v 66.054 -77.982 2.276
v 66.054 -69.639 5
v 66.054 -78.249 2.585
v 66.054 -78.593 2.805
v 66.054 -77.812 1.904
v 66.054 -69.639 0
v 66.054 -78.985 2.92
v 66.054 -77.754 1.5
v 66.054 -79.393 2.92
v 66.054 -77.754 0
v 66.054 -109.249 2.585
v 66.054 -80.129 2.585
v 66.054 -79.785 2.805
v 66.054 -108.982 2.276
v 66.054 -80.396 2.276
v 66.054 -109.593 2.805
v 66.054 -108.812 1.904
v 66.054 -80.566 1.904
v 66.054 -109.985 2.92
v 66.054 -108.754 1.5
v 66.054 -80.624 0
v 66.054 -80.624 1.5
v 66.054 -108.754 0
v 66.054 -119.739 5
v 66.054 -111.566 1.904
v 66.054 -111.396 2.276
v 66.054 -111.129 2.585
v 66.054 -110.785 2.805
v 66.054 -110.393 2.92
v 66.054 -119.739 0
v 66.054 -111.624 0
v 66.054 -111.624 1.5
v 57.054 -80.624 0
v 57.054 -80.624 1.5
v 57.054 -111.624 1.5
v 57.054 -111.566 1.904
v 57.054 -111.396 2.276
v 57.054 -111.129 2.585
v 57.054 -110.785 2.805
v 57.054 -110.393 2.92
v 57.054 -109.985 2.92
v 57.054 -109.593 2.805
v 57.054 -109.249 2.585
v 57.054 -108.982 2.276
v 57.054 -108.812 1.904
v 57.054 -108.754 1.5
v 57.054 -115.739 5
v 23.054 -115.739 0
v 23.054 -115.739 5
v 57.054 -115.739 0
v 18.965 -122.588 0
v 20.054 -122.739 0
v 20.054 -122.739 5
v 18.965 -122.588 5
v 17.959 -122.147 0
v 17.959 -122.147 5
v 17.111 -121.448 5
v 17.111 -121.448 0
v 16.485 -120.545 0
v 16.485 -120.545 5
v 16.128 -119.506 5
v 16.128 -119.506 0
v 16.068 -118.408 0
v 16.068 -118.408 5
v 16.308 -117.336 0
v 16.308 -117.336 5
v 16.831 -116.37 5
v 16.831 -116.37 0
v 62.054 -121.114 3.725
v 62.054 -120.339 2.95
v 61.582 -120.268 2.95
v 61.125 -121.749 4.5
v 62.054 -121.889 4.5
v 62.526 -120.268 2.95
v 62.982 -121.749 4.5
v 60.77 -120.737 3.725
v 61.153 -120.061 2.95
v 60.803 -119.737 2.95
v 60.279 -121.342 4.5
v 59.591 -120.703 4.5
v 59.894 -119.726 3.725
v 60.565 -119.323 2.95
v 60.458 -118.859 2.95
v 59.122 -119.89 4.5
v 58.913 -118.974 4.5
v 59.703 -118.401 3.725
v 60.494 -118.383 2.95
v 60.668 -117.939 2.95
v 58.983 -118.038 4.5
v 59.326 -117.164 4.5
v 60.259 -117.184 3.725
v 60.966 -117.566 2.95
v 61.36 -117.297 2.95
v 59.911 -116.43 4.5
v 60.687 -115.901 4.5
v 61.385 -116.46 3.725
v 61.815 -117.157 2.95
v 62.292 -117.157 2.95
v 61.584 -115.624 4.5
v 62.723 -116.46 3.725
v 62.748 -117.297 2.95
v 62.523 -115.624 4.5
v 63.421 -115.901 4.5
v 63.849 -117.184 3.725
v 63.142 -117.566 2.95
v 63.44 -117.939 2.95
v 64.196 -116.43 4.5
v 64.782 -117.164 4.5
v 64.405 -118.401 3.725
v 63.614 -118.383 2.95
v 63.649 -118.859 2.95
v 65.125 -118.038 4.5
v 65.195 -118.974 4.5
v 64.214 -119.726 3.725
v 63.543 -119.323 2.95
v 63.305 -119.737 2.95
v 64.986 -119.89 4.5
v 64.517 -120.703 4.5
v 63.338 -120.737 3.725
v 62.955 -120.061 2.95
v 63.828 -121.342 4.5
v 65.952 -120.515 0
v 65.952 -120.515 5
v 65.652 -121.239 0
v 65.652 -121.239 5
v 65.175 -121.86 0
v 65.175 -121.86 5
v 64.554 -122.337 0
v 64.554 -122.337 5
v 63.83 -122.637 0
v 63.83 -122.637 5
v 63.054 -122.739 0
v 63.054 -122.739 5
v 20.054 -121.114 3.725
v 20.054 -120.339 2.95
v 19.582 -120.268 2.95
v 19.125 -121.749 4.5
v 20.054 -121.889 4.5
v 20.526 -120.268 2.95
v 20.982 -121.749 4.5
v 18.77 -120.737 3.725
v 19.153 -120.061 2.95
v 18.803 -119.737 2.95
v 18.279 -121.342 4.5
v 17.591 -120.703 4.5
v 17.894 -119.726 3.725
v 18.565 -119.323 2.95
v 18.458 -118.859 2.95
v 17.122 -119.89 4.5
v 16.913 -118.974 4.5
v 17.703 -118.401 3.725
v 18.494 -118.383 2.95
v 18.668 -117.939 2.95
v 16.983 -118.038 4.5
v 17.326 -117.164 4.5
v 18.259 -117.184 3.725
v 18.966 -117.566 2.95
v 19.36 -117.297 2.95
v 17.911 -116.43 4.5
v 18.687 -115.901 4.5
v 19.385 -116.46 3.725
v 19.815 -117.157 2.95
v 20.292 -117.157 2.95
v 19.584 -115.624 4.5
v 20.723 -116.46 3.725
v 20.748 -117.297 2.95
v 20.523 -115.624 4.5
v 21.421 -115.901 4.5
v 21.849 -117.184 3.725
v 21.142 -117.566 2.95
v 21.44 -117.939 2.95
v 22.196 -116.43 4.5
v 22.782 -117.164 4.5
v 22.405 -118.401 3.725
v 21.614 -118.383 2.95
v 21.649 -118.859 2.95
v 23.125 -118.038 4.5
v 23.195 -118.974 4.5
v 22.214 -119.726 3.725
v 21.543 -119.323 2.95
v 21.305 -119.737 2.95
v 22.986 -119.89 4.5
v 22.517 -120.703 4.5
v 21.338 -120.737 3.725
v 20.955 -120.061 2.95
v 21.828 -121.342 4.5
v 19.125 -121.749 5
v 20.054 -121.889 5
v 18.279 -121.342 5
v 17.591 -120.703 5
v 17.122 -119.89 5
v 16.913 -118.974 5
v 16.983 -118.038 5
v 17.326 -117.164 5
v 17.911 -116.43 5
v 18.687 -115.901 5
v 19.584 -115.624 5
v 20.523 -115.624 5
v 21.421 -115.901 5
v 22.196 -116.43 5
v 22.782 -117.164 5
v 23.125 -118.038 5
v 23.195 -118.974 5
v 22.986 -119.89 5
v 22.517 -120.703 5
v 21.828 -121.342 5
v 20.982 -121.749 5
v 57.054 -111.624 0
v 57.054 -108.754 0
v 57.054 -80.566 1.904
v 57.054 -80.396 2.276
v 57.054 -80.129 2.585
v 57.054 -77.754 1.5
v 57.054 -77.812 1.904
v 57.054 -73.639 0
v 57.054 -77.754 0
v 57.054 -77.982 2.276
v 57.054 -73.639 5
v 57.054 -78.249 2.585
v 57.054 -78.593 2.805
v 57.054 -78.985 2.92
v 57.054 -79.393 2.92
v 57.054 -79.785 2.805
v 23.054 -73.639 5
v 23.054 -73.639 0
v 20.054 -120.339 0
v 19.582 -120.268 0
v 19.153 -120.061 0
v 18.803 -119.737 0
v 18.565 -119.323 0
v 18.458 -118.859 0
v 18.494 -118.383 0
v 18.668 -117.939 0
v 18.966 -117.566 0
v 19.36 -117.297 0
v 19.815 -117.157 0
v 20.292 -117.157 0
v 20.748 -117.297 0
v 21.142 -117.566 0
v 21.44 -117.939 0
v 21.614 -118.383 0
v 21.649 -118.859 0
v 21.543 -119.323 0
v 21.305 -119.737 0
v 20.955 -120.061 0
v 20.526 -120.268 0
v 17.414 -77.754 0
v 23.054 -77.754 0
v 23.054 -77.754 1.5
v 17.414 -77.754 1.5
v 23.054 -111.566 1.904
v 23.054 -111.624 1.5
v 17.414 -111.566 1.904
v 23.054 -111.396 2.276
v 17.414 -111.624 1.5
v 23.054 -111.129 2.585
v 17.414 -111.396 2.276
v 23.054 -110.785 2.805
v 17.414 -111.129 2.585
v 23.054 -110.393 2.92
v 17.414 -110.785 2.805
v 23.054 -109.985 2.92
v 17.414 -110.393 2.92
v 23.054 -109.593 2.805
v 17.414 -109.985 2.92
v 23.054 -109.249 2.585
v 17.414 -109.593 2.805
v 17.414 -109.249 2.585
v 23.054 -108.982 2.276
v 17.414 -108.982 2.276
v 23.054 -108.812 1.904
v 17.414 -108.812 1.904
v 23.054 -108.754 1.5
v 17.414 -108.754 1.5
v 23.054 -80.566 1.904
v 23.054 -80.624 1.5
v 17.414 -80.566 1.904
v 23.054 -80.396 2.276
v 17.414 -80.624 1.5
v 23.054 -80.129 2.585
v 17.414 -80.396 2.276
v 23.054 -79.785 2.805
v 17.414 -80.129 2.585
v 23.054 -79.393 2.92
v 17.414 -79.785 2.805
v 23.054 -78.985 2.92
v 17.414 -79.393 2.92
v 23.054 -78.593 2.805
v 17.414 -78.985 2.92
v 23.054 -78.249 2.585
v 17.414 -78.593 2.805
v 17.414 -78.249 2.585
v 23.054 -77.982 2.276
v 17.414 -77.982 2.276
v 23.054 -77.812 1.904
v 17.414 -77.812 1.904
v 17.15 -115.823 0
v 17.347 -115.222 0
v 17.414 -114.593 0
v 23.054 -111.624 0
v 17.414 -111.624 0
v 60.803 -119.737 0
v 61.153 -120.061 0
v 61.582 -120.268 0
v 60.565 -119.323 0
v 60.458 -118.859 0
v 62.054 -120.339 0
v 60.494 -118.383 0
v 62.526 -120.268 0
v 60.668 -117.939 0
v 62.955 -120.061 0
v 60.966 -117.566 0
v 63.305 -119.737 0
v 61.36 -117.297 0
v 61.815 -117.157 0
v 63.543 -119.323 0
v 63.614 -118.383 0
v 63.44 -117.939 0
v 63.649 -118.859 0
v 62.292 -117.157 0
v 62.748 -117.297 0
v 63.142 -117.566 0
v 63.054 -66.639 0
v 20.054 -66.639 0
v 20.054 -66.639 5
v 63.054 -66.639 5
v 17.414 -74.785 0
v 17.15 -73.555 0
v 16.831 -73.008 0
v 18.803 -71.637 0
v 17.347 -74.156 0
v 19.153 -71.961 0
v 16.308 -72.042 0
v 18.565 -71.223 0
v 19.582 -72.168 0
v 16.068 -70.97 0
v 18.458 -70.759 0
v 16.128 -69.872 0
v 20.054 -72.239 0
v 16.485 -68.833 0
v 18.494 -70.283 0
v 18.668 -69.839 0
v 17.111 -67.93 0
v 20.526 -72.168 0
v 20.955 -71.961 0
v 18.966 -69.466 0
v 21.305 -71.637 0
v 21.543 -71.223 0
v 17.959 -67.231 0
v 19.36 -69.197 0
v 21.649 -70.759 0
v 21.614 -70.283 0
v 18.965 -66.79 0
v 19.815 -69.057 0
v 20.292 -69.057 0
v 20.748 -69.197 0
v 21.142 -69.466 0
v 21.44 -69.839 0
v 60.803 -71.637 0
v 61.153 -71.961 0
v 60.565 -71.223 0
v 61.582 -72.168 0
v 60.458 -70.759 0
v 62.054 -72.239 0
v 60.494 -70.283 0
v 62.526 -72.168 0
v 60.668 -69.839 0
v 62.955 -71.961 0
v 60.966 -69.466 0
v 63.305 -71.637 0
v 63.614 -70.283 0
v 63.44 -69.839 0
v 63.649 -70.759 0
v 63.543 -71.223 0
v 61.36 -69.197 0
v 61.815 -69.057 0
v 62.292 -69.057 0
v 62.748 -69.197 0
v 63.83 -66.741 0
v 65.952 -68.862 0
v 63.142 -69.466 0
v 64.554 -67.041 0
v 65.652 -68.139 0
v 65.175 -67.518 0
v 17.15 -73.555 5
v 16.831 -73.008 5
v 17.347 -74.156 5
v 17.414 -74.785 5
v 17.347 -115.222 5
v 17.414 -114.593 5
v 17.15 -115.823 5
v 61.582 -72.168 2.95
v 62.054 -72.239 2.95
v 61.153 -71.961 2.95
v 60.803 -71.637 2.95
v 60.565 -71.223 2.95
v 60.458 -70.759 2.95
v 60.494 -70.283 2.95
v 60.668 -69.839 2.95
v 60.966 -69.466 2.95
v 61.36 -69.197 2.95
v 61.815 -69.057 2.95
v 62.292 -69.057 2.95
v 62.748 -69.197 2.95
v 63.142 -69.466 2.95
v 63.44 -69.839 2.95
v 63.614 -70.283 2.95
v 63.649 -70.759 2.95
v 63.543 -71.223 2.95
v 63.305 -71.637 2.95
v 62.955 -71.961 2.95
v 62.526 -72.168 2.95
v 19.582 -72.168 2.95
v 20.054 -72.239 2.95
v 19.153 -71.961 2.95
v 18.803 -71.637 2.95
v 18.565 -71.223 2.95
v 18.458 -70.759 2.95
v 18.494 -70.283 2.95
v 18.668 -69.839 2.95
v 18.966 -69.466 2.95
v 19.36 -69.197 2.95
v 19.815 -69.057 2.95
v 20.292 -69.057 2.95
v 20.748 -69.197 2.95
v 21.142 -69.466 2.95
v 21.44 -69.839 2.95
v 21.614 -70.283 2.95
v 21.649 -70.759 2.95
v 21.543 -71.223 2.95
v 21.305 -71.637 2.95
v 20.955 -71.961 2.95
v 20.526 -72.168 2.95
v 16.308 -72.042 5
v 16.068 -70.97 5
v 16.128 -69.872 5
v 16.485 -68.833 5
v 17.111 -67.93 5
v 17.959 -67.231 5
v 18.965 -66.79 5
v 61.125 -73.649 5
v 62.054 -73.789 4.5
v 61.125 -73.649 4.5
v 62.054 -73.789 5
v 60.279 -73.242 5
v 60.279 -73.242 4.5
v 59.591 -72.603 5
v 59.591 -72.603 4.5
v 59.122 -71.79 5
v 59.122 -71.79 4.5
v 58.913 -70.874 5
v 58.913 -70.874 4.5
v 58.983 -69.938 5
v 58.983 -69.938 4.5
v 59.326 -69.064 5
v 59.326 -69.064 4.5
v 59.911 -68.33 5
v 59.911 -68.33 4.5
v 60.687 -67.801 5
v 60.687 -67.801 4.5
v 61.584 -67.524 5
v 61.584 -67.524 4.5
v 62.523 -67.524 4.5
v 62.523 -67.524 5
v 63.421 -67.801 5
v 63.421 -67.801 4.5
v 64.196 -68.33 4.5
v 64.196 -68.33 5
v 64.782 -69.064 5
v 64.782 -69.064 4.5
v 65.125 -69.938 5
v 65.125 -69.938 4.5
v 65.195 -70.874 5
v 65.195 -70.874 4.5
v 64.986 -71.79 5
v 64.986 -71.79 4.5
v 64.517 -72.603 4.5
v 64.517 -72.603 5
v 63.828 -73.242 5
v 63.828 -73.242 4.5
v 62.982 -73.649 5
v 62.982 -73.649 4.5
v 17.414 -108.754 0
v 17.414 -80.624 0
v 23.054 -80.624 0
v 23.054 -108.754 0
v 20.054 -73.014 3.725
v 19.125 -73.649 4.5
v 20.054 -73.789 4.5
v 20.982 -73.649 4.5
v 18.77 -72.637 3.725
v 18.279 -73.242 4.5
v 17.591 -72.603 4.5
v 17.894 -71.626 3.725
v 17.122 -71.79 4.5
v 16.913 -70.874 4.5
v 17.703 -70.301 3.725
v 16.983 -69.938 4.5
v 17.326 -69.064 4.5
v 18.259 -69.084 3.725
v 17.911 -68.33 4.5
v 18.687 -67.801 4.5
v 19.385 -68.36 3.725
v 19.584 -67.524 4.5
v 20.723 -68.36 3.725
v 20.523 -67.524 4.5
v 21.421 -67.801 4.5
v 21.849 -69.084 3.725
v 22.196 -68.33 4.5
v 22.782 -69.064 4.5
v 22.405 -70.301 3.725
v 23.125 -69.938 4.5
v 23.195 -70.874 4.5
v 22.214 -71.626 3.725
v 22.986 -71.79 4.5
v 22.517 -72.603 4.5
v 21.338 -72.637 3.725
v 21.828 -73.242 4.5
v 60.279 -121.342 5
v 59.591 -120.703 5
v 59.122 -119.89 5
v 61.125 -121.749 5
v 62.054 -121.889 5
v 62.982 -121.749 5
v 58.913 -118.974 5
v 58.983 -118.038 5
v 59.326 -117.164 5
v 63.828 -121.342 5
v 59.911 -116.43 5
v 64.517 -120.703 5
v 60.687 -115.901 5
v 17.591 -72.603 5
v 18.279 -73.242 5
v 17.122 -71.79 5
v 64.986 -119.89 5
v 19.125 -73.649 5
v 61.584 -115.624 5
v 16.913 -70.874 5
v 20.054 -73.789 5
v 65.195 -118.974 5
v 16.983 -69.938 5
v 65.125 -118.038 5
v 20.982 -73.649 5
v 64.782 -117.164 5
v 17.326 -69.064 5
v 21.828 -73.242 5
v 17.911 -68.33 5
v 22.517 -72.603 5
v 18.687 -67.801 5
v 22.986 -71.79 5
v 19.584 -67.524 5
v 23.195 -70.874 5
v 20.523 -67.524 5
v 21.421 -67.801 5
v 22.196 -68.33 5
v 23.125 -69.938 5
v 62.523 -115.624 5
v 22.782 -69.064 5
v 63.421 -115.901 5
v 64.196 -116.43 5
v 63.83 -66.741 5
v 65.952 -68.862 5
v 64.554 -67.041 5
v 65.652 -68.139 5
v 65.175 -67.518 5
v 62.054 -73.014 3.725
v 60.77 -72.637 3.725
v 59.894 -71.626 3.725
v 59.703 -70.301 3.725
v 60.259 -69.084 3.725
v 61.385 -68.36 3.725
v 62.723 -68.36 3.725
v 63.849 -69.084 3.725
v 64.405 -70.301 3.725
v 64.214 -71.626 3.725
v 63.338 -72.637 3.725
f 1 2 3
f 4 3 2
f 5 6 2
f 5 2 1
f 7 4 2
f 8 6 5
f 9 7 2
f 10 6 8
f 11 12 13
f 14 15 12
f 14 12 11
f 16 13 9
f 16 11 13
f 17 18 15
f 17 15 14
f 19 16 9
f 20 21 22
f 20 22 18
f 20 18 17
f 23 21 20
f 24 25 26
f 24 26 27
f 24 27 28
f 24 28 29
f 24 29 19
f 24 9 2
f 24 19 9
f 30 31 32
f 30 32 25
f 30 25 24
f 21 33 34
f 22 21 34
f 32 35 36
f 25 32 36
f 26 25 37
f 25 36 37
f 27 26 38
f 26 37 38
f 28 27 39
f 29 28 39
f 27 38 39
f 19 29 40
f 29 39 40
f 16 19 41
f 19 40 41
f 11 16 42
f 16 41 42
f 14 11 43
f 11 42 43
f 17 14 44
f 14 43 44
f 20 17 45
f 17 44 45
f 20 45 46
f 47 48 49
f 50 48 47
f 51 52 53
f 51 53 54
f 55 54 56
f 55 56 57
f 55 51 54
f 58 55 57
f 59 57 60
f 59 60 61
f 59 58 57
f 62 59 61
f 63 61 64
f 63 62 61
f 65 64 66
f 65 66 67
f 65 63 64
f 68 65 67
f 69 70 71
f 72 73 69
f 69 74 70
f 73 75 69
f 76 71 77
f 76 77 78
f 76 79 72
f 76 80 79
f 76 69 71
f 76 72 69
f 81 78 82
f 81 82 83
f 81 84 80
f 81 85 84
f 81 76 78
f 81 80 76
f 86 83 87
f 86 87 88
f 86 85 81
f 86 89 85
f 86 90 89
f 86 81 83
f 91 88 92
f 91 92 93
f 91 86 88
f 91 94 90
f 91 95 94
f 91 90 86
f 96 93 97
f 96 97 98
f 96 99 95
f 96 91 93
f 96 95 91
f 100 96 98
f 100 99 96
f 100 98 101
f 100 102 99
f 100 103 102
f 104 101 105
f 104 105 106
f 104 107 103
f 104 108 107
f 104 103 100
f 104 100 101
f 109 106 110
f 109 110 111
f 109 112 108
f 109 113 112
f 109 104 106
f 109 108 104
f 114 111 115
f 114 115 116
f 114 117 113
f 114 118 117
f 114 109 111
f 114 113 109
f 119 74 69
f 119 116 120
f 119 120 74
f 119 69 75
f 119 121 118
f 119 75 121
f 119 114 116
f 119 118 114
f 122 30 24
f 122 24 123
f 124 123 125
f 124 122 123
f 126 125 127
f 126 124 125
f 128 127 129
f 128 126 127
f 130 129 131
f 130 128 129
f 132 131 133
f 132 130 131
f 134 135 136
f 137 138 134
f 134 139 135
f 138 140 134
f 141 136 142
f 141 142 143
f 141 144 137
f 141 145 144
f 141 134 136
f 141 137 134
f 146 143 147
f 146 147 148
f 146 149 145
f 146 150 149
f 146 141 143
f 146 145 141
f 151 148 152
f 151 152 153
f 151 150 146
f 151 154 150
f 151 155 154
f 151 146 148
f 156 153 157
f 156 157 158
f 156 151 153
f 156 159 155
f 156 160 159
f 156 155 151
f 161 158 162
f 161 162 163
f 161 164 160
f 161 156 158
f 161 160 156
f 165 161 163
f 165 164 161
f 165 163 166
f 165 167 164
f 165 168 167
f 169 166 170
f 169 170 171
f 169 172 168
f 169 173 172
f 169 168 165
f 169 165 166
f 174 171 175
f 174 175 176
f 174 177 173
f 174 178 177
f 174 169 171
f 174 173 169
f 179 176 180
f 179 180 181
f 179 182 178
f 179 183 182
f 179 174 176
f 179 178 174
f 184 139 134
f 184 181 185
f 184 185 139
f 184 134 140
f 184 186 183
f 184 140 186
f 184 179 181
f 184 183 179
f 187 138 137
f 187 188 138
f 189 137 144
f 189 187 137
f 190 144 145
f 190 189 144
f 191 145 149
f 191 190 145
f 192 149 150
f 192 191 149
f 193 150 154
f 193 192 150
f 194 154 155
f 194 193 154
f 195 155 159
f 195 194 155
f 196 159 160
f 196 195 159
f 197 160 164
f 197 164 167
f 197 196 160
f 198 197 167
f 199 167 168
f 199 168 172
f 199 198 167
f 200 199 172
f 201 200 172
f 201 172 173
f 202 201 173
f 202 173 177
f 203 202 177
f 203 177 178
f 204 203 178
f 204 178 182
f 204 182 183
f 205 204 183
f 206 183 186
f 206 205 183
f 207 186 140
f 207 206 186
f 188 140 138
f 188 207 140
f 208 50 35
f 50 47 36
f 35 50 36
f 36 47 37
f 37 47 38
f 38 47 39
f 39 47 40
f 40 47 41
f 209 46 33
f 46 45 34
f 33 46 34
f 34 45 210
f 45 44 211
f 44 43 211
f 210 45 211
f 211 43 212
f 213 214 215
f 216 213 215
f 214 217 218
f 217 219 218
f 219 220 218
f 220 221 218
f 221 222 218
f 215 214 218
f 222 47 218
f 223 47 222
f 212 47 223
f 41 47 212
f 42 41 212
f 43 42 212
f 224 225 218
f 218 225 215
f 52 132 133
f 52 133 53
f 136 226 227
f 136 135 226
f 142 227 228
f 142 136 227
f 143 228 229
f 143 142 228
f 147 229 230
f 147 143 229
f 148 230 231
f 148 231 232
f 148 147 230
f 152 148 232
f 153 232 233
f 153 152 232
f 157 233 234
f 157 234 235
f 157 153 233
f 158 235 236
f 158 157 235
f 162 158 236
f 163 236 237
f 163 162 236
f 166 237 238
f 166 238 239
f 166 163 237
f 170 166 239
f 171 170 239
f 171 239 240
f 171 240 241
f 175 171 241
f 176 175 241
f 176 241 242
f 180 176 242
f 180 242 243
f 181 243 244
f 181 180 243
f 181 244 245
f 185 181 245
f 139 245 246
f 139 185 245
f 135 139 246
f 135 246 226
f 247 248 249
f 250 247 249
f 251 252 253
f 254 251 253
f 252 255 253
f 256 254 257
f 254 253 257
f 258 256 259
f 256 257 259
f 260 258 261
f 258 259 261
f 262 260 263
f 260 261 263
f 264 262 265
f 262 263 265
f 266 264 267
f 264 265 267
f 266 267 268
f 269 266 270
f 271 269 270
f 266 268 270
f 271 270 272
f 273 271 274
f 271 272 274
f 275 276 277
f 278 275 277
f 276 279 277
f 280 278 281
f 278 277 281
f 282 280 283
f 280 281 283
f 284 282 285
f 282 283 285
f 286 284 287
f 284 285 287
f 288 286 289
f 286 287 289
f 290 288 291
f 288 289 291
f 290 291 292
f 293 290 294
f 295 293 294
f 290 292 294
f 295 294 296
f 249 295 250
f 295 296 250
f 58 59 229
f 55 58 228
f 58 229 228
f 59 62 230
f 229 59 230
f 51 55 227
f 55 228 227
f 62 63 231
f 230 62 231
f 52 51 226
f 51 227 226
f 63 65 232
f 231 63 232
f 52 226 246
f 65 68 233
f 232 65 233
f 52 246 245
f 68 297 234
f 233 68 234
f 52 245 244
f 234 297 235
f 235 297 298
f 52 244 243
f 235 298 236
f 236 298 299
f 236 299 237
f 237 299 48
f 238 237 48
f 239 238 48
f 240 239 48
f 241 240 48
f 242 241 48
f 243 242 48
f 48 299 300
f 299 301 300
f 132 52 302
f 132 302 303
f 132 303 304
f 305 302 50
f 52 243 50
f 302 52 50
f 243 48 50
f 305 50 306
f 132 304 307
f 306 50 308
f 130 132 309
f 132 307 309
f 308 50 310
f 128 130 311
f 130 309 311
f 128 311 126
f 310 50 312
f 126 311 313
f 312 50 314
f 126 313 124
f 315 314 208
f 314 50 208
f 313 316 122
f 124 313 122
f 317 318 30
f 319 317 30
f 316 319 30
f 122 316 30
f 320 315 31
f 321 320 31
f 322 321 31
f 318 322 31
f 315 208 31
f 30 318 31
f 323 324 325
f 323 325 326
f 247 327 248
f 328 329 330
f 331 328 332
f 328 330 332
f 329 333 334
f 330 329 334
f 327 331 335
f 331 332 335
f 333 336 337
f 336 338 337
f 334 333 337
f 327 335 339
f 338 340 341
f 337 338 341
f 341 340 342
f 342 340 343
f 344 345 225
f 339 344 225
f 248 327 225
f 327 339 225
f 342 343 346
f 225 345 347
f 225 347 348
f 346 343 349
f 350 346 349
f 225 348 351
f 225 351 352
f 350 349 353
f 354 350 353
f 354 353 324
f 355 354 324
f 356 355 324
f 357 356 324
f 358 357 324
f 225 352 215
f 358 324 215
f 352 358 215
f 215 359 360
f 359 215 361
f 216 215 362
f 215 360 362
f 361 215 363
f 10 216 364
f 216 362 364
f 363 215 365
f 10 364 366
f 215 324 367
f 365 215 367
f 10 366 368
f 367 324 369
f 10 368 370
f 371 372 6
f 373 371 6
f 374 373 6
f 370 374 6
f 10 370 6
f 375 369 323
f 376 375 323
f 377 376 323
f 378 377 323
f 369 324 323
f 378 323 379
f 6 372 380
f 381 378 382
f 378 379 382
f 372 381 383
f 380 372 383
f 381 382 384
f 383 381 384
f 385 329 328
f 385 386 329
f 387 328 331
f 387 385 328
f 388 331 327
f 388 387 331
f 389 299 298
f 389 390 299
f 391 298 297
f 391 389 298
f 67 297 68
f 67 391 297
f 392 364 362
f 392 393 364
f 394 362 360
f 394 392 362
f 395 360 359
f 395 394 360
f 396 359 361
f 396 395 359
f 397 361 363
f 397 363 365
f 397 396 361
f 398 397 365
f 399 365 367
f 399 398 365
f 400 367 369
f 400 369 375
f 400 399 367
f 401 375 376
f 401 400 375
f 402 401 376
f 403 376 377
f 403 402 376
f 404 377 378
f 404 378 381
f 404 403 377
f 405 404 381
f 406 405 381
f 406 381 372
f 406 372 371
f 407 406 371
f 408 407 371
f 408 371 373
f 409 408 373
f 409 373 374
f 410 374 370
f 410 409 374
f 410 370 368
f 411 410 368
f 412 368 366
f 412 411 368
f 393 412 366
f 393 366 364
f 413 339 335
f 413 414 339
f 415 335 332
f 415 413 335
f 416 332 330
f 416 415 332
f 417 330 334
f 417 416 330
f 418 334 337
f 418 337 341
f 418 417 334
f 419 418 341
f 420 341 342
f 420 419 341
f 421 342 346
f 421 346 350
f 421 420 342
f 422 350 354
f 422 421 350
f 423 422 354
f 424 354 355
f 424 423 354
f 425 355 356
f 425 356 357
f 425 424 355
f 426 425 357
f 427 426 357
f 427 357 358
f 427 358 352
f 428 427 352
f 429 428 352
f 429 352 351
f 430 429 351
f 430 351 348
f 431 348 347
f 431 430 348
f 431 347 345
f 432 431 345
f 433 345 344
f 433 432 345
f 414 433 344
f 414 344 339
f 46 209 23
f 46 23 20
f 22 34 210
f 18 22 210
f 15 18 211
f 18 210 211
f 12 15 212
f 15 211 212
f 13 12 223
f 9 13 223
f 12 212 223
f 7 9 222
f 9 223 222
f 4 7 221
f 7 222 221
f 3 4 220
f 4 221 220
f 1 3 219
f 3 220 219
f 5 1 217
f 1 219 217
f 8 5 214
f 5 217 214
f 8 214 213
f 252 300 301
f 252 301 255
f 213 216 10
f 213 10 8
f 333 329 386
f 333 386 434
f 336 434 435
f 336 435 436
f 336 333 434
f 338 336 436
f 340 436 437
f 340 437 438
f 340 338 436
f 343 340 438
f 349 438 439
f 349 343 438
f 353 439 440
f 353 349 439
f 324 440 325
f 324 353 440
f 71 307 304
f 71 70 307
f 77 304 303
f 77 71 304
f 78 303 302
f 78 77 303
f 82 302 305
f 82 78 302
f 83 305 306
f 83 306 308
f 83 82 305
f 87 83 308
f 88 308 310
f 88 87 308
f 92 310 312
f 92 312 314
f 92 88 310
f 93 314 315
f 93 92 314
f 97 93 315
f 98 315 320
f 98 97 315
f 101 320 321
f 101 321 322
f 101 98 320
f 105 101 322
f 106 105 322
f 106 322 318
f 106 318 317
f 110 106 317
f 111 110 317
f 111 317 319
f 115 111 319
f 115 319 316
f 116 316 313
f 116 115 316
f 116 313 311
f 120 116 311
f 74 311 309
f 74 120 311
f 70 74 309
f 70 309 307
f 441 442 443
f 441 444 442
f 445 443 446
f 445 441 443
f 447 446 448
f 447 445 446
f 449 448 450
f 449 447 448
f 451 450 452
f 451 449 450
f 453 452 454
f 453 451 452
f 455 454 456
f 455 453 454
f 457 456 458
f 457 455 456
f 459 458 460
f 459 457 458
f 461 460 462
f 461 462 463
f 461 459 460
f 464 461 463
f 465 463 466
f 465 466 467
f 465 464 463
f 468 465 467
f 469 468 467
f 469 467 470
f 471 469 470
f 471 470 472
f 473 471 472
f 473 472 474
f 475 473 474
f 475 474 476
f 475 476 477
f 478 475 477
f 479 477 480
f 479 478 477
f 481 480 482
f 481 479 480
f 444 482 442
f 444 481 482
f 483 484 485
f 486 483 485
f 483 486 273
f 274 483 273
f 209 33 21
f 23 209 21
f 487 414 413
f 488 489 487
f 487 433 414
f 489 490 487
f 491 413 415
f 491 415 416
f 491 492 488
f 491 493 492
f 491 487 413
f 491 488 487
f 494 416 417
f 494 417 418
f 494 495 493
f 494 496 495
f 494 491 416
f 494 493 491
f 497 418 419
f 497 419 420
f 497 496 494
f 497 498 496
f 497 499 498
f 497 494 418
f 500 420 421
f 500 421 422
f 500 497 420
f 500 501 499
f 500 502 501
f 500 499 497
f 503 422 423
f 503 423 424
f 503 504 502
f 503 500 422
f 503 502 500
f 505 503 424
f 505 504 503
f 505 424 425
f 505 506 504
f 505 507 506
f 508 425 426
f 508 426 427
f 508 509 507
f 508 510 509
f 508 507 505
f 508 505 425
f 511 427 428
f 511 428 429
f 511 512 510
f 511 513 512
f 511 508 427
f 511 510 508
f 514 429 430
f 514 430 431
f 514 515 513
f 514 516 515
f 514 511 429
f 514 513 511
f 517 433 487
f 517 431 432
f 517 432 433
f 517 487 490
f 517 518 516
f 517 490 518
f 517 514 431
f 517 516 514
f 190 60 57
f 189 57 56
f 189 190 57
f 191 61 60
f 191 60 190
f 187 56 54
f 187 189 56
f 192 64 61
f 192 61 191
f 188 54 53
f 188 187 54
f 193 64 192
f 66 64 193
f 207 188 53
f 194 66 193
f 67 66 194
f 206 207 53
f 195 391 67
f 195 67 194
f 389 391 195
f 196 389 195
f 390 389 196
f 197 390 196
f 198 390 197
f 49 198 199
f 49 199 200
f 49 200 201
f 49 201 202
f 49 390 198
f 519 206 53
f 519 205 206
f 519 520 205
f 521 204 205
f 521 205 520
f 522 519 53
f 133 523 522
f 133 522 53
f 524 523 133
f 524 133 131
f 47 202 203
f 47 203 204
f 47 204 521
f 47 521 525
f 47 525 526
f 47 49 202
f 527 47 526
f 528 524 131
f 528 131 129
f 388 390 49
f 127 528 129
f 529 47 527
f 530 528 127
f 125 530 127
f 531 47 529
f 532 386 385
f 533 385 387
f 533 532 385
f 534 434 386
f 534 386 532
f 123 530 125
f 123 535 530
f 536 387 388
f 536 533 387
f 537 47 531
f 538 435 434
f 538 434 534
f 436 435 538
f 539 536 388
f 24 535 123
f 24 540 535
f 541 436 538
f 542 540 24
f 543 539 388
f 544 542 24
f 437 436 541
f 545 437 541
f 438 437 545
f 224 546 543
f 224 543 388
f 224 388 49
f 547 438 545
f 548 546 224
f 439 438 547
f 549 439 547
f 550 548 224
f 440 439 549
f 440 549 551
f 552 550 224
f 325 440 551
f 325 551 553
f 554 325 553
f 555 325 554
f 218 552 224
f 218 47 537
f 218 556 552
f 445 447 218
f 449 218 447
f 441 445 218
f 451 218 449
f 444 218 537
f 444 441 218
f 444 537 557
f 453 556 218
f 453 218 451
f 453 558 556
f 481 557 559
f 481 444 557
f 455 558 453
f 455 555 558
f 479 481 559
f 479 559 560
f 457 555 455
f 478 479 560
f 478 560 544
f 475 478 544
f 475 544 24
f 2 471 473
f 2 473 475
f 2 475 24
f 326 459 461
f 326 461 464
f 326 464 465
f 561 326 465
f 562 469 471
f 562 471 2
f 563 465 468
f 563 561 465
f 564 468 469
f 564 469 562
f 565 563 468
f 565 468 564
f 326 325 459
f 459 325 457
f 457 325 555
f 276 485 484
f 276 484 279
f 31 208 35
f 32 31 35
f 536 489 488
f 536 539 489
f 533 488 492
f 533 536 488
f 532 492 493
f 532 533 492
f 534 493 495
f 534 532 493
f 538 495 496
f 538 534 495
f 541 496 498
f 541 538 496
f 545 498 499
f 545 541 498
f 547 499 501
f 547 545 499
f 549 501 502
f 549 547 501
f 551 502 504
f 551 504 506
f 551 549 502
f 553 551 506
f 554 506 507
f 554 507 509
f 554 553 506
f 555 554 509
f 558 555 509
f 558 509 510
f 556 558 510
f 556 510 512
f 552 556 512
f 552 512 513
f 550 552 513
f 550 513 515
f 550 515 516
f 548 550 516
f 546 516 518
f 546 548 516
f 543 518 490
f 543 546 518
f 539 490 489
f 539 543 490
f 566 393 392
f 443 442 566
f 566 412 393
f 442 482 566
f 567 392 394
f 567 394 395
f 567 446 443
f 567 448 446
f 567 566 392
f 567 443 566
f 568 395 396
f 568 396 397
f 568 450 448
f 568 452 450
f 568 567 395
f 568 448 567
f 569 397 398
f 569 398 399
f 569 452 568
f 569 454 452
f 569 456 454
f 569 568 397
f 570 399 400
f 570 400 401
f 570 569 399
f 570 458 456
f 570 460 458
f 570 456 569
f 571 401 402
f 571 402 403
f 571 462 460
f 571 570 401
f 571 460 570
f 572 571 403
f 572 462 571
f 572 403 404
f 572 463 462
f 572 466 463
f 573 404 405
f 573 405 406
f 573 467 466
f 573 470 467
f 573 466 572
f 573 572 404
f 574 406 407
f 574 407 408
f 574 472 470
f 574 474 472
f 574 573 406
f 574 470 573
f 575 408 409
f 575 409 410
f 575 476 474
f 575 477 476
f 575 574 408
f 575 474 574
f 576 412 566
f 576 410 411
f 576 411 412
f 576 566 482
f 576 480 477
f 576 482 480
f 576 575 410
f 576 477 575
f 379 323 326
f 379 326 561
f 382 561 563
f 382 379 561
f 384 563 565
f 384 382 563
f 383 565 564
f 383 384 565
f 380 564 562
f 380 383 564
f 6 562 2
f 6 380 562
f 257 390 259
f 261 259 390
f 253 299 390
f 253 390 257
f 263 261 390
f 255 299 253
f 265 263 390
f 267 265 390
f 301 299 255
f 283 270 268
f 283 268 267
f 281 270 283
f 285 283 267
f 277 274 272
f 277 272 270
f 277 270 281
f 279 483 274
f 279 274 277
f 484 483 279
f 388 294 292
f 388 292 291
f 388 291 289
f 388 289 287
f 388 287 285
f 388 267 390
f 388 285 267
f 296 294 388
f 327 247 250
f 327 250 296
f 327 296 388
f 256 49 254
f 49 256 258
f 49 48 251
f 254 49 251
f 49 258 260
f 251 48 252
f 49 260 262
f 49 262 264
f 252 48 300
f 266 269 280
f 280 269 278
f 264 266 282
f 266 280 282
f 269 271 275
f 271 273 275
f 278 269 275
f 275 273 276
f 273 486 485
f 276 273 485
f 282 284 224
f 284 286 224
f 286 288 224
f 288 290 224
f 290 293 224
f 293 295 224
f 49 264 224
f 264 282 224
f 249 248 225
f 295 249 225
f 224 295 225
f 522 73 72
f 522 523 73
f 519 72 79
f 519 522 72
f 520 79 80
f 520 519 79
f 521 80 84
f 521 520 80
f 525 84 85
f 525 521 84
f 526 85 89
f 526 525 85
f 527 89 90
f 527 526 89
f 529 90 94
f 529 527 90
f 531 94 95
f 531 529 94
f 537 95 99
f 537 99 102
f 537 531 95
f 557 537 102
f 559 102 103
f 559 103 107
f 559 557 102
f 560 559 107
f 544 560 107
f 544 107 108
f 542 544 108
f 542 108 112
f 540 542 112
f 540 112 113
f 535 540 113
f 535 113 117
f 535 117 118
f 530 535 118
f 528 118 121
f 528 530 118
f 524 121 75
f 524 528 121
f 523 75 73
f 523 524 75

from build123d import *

# Parameters (mm, degrees)
SKETCH1_R                                    = 1.25
SKETCH1_W                                    = 36
SKETCH1_H                                    = 42.1
BOSS_EXTRUDE1_DEPTH                          = 5
SKETCH6_W                                    = 2
SKETCH6_H                                    = 42.1
BOSS_EXTRUDE4_DEPTH                          = 5
CSK_FOR_M3_COUNTERSUNK_FLAT_HEAD_SCR_2_COUNT = 2
CSK_FOR_M3_COUNTERSUNK_FLAT_HEAD_SCR_2_PITCH = 48.1
CSK_FOR_M3_COUNTERSUNK_FLAT_HEAD_SCR_3_COUNT = 2
CSK_FOR_M3_COUNTERSUNK_FLAT_HEAD_SCR_3_PITCH = 63.856166499
CSK_FOR_M3_COUNTERSUNK_FLAT_HEAD_SCR_4_COUNT = 2
CSK_FOR_M3_COUNTERSUNK_FLAT_HEAD_SCR_4_PITCH = 42
FURO_COM_FOLGA_DE_M34_D                      = 2.87
FILETE1_R                                    = 3
ESBO_O3_W                                    = 1.5
ESBO_O3_H                                    = 2.87
CORTE_EXTRUS_O1_DEPTH                        = 63
CORTE_EXTRUS_O1_DEPTH_BACK                   = 10


with BuildPart() as part:
    # Sketch1 → Boss-Extrude1 (new body)
    with BuildSketch(Plane.XY):
        with BuildLine():
            Line((20.053938932, -66.638943184), (63.053938932, -66.638943184))
            ThreePointArc((63.053938932, -66.638943184), (65.175259276, -67.517622841), (66.053938932, -69.638943184))
            Line((66.053938932, -69.638943184), (66.053938932, -119.738943184))
            ThreePointArc((66.053938932, -119.738943184), (65.175259276, -121.860263528), (63.053938932, -122.738943184))
            Line((63.053938932, -122.738943184), (20.053938932, -122.738943184))
            ThreePointArc((20.053938932, -122.738943184), (16.310928808, -120.149572552), (17.413938931, -115.73388079))
            Line((17.413938931, -115.73388079), (17.413938931, -73.644005579))
            ThreePointArc((17.413938931, -73.644005579), (16.310928808, -69.228313817), (20.053938932, -66.638943184))
        make_face()
        with Locations((20.053938932, -70.638943184)):
            Circle(SKETCH1_R, mode=Mode.SUBTRACT)
        with Locations((20.053938932, -118.738943184)):
            Circle(SKETCH1_R, mode=Mode.SUBTRACT)
        with Locations((62.053938932, -70.638943184)):
            Circle(SKETCH1_R, mode=Mode.SUBTRACT)
        with Locations((62.053938932, -118.738943184)):
            Circle(SKETCH1_R, mode=Mode.SUBTRACT)
        with Locations((41.053938932, -94.688943184)):
            Rectangle(SKETCH1_W, SKETCH1_H, mode=Mode.SUBTRACT)
    extrude(amount=BOSS_EXTRUDE1_DEPTH)

    # Sketch6 → Boss-Extrude4 (add)
    with BuildSketch(Plane.XY.offset(5)):
        with Locations((58.053938932, -94.688943184)):
            Rectangle(SKETCH6_W, SKETCH6_H)
    extrude(amount=-BOSS_EXTRUDE4_DEPTH)

    # Sketch2 → CSK for M3 Countersunk Flat Head Screw1 (revolve, cut)
    with BuildSketch(Plane(origin=(20.053938932, -118.738943184, 5), x_dir=(0, -1, 0), z_dir=(1, 0, 0))):
        Polygon((0, 0), (0, 5), (1.6, 5), (1.6, 2.05), (3.15, 0.5), (3.15, 0), align=None)
    csk_for_m3_countersunk_flat_head_screw1 = revolve(axis=Axis((20.053938932, -118.738943184, 11.35), (0, 0, -1)), mode=Mode.SUBTRACT)

    # CSK for M3 Countersunk Flat Head Scr 2: CSK for M3 Countersunk Flat Head Screw1 ×2
    with Locations(*[(0, i * CSK_FOR_M3_COUNTERSUNK_FLAT_HEAD_SCR_2_PITCH, 0) for i in range(1, CSK_FOR_M3_COUNTERSUNK_FLAT_HEAD_SCR_2_COUNT)]):
        add(csk_for_m3_countersunk_flat_head_screw1, mode=Mode.SUBTRACT)

    # CSK for M3 Countersunk Flat Head Scr 3: CSK for M3 Countersunk Flat Head Screw1 ×2
    with Locations(*[Vector(0.657728177, 0.753255365, 0) * (i * CSK_FOR_M3_COUNTERSUNK_FLAT_HEAD_SCR_3_PITCH) for i in range(1, CSK_FOR_M3_COUNTERSUNK_FLAT_HEAD_SCR_3_COUNT)]):
        add(csk_for_m3_countersunk_flat_head_screw1, mode=Mode.SUBTRACT)

    # CSK for M3 Countersunk Flat Head Scr 4: CSK for M3 Countersunk Flat Head Screw1 ×2
    with Locations(*[(i * CSK_FOR_M3_COUNTERSUNK_FLAT_HEAD_SCR_4_PITCH, 0, 0) for i in range(1, CSK_FOR_M3_COUNTERSUNK_FLAT_HEAD_SCR_4_COUNT)]):
        add(csk_for_m3_countersunk_flat_head_screw1, mode=Mode.SUBTRACT)

    # Furo com folga de M34 (through all)
    with Locations(Plane(origin=(66.053938932, 0, 0), x_dir=(0, 0, -1), z_dir=(1, 0, 0))):
        with Locations((-1.5, -79.188943184), (-1.5, -110.188943184)):
            Hole(FURO_COM_FOLGA_DE_M34_D / 2)

    # Filete1
    filete1_edges = [part.edges().sort_by_distance(p)[0] for p in [
        (17.413938931, -115.73388079, 2.5),
        (17.413938931, -73.644005579, 2.5),
    ]]
    fillet(filete1_edges, radius=FILETE1_R)

    # Esboço3 → Corte-extrusão1 (cut, two sides)
    with BuildSketch(Plane.ZY.offset(-57.053938932)) as corte_extrus_o1_sk:
        with Locations((0.75, -79.188943184)):
            Rectangle(ESBO_O3_W, ESBO_O3_H)
        with Locations((0.75, -110.188943184)):
            Rectangle(ESBO_O3_W, ESBO_O3_H)
    extrude(amount=CORTE_EXTRUS_O1_DEPTH, mode=Mode.SUBTRACT)
    extrude(corte_extrus_o1_sk.sketch, amount=-CORTE_EXTRUS_O1_DEPTH_BACK, mode=Mode.SUBTRACT)


solid = part.part
